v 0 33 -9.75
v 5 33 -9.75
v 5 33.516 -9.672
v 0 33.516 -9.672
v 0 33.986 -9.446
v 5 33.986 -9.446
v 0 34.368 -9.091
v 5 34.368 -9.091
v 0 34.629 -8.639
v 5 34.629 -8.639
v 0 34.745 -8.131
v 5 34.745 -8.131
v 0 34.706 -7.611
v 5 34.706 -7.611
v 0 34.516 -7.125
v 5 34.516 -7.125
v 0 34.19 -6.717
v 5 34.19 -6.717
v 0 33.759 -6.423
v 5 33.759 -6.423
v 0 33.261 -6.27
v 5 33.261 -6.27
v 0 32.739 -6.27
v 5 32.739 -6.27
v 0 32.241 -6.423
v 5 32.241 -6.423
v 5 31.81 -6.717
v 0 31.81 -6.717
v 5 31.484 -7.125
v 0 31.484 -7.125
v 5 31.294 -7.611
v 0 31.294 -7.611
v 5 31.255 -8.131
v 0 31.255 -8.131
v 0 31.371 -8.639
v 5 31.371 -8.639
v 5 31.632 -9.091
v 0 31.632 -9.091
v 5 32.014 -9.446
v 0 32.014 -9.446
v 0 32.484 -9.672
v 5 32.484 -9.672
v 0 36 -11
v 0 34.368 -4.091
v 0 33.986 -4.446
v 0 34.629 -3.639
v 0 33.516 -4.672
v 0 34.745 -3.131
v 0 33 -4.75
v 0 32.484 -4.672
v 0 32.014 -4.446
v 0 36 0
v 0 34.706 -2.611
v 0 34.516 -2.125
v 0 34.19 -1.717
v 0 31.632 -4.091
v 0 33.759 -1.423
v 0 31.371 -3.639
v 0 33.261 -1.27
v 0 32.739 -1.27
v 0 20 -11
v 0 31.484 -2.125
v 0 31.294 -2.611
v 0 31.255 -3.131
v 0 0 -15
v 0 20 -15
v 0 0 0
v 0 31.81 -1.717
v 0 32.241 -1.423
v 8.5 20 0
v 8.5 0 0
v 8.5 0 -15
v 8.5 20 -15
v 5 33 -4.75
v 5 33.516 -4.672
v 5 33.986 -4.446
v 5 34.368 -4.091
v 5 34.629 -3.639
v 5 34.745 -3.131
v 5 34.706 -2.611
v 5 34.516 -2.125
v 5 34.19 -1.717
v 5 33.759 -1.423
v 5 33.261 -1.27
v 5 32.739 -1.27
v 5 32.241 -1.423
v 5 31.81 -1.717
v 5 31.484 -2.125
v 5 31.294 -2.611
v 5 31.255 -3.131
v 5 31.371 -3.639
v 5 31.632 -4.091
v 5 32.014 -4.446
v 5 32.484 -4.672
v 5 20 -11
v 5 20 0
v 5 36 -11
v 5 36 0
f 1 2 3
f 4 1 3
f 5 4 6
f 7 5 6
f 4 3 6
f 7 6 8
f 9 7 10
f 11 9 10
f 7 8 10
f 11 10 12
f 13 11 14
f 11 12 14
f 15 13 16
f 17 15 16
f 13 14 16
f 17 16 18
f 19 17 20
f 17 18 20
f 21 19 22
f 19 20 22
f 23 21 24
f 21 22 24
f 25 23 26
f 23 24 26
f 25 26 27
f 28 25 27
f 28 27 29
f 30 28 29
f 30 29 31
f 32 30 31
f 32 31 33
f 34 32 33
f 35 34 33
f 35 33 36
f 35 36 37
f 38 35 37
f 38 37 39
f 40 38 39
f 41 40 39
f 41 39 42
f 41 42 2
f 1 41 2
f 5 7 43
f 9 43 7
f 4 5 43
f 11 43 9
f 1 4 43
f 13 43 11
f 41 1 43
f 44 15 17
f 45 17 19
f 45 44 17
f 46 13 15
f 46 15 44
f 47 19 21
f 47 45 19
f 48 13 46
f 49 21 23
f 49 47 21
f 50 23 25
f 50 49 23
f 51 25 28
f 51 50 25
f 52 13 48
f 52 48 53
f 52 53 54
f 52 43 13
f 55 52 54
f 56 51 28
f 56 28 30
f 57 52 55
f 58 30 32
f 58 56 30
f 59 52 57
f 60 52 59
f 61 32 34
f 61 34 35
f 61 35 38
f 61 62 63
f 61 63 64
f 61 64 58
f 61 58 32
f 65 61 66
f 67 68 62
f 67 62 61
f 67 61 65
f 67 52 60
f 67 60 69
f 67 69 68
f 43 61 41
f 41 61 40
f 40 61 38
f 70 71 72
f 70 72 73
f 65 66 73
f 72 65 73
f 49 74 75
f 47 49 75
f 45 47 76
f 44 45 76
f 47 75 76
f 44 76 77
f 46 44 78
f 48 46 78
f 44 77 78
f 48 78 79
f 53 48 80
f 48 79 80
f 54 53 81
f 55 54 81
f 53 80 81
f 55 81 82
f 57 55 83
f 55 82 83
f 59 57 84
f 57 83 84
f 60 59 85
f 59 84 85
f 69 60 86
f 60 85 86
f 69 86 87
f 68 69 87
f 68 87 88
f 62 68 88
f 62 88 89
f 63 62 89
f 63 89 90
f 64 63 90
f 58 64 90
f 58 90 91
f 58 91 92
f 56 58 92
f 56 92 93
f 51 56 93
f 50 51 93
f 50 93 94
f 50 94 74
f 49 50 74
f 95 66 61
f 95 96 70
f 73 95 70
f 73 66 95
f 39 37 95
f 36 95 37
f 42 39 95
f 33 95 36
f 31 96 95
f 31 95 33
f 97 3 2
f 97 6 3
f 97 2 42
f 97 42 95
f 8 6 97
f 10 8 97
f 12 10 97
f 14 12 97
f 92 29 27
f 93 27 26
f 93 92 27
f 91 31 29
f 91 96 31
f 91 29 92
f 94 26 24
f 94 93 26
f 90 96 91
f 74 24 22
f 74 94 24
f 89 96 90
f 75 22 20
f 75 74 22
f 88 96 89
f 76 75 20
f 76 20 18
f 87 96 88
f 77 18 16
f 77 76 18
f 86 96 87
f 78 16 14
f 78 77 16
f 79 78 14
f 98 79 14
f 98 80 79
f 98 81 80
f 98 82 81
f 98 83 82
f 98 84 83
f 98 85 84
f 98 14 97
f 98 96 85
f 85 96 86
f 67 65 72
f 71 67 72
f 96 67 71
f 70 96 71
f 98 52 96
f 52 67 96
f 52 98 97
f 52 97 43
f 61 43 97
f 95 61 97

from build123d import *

# Parameters (mm, degrees)
BOSS_EXTRUDE1_DEPTH = 15
SKETCH2_W           = 5
SKETCH2_H           = 4
CUT_EXTRUDE1_DEPTH  = 16
SKETCH7_R           = 1.75
CUT_EXTRUDE3_DEPTH  = 6


with BuildPart() as part:
    # Sketch1 → Boss-Extrude1 (new body)
    with BuildSketch(Plane.XY):
        Polygon((0, 36), (0, 0), (8.5, 0), (8.5, 20), (5, 20), (5, 36), align=None)
    extrude(amount=-BOSS_EXTRUDE1_DEPTH)

    # Sketch2 → Cut-Extrude1 (cut)
    with BuildSketch(Plane(origin=(0, 36, 0), x_dir=(1, 0, 0), z_dir=(0, 1, 0))):
        with Locations((2.5, 13)):
            Rectangle(SKETCH2_W, SKETCH2_H)
    extrude(amount=-CUT_EXTRUDE1_DEPTH, mode=Mode.SUBTRACT)

    # Sketch7 → Cut-Extrude3 (cut, through all)
    with BuildSketch(Plane(origin=(5, 0, 0), x_dir=(0, 0, -1), z_dir=(1, 0, 0))):
        with Locations((3, 33)):
            Circle(SKETCH7_R)
        with Locations((8, 33)):
            Circle(SKETCH7_R)
    extrude(amount=-CUT_EXTRUDE3_DEPTH, mode=Mode.SUBTRACT)


solid = part.part
